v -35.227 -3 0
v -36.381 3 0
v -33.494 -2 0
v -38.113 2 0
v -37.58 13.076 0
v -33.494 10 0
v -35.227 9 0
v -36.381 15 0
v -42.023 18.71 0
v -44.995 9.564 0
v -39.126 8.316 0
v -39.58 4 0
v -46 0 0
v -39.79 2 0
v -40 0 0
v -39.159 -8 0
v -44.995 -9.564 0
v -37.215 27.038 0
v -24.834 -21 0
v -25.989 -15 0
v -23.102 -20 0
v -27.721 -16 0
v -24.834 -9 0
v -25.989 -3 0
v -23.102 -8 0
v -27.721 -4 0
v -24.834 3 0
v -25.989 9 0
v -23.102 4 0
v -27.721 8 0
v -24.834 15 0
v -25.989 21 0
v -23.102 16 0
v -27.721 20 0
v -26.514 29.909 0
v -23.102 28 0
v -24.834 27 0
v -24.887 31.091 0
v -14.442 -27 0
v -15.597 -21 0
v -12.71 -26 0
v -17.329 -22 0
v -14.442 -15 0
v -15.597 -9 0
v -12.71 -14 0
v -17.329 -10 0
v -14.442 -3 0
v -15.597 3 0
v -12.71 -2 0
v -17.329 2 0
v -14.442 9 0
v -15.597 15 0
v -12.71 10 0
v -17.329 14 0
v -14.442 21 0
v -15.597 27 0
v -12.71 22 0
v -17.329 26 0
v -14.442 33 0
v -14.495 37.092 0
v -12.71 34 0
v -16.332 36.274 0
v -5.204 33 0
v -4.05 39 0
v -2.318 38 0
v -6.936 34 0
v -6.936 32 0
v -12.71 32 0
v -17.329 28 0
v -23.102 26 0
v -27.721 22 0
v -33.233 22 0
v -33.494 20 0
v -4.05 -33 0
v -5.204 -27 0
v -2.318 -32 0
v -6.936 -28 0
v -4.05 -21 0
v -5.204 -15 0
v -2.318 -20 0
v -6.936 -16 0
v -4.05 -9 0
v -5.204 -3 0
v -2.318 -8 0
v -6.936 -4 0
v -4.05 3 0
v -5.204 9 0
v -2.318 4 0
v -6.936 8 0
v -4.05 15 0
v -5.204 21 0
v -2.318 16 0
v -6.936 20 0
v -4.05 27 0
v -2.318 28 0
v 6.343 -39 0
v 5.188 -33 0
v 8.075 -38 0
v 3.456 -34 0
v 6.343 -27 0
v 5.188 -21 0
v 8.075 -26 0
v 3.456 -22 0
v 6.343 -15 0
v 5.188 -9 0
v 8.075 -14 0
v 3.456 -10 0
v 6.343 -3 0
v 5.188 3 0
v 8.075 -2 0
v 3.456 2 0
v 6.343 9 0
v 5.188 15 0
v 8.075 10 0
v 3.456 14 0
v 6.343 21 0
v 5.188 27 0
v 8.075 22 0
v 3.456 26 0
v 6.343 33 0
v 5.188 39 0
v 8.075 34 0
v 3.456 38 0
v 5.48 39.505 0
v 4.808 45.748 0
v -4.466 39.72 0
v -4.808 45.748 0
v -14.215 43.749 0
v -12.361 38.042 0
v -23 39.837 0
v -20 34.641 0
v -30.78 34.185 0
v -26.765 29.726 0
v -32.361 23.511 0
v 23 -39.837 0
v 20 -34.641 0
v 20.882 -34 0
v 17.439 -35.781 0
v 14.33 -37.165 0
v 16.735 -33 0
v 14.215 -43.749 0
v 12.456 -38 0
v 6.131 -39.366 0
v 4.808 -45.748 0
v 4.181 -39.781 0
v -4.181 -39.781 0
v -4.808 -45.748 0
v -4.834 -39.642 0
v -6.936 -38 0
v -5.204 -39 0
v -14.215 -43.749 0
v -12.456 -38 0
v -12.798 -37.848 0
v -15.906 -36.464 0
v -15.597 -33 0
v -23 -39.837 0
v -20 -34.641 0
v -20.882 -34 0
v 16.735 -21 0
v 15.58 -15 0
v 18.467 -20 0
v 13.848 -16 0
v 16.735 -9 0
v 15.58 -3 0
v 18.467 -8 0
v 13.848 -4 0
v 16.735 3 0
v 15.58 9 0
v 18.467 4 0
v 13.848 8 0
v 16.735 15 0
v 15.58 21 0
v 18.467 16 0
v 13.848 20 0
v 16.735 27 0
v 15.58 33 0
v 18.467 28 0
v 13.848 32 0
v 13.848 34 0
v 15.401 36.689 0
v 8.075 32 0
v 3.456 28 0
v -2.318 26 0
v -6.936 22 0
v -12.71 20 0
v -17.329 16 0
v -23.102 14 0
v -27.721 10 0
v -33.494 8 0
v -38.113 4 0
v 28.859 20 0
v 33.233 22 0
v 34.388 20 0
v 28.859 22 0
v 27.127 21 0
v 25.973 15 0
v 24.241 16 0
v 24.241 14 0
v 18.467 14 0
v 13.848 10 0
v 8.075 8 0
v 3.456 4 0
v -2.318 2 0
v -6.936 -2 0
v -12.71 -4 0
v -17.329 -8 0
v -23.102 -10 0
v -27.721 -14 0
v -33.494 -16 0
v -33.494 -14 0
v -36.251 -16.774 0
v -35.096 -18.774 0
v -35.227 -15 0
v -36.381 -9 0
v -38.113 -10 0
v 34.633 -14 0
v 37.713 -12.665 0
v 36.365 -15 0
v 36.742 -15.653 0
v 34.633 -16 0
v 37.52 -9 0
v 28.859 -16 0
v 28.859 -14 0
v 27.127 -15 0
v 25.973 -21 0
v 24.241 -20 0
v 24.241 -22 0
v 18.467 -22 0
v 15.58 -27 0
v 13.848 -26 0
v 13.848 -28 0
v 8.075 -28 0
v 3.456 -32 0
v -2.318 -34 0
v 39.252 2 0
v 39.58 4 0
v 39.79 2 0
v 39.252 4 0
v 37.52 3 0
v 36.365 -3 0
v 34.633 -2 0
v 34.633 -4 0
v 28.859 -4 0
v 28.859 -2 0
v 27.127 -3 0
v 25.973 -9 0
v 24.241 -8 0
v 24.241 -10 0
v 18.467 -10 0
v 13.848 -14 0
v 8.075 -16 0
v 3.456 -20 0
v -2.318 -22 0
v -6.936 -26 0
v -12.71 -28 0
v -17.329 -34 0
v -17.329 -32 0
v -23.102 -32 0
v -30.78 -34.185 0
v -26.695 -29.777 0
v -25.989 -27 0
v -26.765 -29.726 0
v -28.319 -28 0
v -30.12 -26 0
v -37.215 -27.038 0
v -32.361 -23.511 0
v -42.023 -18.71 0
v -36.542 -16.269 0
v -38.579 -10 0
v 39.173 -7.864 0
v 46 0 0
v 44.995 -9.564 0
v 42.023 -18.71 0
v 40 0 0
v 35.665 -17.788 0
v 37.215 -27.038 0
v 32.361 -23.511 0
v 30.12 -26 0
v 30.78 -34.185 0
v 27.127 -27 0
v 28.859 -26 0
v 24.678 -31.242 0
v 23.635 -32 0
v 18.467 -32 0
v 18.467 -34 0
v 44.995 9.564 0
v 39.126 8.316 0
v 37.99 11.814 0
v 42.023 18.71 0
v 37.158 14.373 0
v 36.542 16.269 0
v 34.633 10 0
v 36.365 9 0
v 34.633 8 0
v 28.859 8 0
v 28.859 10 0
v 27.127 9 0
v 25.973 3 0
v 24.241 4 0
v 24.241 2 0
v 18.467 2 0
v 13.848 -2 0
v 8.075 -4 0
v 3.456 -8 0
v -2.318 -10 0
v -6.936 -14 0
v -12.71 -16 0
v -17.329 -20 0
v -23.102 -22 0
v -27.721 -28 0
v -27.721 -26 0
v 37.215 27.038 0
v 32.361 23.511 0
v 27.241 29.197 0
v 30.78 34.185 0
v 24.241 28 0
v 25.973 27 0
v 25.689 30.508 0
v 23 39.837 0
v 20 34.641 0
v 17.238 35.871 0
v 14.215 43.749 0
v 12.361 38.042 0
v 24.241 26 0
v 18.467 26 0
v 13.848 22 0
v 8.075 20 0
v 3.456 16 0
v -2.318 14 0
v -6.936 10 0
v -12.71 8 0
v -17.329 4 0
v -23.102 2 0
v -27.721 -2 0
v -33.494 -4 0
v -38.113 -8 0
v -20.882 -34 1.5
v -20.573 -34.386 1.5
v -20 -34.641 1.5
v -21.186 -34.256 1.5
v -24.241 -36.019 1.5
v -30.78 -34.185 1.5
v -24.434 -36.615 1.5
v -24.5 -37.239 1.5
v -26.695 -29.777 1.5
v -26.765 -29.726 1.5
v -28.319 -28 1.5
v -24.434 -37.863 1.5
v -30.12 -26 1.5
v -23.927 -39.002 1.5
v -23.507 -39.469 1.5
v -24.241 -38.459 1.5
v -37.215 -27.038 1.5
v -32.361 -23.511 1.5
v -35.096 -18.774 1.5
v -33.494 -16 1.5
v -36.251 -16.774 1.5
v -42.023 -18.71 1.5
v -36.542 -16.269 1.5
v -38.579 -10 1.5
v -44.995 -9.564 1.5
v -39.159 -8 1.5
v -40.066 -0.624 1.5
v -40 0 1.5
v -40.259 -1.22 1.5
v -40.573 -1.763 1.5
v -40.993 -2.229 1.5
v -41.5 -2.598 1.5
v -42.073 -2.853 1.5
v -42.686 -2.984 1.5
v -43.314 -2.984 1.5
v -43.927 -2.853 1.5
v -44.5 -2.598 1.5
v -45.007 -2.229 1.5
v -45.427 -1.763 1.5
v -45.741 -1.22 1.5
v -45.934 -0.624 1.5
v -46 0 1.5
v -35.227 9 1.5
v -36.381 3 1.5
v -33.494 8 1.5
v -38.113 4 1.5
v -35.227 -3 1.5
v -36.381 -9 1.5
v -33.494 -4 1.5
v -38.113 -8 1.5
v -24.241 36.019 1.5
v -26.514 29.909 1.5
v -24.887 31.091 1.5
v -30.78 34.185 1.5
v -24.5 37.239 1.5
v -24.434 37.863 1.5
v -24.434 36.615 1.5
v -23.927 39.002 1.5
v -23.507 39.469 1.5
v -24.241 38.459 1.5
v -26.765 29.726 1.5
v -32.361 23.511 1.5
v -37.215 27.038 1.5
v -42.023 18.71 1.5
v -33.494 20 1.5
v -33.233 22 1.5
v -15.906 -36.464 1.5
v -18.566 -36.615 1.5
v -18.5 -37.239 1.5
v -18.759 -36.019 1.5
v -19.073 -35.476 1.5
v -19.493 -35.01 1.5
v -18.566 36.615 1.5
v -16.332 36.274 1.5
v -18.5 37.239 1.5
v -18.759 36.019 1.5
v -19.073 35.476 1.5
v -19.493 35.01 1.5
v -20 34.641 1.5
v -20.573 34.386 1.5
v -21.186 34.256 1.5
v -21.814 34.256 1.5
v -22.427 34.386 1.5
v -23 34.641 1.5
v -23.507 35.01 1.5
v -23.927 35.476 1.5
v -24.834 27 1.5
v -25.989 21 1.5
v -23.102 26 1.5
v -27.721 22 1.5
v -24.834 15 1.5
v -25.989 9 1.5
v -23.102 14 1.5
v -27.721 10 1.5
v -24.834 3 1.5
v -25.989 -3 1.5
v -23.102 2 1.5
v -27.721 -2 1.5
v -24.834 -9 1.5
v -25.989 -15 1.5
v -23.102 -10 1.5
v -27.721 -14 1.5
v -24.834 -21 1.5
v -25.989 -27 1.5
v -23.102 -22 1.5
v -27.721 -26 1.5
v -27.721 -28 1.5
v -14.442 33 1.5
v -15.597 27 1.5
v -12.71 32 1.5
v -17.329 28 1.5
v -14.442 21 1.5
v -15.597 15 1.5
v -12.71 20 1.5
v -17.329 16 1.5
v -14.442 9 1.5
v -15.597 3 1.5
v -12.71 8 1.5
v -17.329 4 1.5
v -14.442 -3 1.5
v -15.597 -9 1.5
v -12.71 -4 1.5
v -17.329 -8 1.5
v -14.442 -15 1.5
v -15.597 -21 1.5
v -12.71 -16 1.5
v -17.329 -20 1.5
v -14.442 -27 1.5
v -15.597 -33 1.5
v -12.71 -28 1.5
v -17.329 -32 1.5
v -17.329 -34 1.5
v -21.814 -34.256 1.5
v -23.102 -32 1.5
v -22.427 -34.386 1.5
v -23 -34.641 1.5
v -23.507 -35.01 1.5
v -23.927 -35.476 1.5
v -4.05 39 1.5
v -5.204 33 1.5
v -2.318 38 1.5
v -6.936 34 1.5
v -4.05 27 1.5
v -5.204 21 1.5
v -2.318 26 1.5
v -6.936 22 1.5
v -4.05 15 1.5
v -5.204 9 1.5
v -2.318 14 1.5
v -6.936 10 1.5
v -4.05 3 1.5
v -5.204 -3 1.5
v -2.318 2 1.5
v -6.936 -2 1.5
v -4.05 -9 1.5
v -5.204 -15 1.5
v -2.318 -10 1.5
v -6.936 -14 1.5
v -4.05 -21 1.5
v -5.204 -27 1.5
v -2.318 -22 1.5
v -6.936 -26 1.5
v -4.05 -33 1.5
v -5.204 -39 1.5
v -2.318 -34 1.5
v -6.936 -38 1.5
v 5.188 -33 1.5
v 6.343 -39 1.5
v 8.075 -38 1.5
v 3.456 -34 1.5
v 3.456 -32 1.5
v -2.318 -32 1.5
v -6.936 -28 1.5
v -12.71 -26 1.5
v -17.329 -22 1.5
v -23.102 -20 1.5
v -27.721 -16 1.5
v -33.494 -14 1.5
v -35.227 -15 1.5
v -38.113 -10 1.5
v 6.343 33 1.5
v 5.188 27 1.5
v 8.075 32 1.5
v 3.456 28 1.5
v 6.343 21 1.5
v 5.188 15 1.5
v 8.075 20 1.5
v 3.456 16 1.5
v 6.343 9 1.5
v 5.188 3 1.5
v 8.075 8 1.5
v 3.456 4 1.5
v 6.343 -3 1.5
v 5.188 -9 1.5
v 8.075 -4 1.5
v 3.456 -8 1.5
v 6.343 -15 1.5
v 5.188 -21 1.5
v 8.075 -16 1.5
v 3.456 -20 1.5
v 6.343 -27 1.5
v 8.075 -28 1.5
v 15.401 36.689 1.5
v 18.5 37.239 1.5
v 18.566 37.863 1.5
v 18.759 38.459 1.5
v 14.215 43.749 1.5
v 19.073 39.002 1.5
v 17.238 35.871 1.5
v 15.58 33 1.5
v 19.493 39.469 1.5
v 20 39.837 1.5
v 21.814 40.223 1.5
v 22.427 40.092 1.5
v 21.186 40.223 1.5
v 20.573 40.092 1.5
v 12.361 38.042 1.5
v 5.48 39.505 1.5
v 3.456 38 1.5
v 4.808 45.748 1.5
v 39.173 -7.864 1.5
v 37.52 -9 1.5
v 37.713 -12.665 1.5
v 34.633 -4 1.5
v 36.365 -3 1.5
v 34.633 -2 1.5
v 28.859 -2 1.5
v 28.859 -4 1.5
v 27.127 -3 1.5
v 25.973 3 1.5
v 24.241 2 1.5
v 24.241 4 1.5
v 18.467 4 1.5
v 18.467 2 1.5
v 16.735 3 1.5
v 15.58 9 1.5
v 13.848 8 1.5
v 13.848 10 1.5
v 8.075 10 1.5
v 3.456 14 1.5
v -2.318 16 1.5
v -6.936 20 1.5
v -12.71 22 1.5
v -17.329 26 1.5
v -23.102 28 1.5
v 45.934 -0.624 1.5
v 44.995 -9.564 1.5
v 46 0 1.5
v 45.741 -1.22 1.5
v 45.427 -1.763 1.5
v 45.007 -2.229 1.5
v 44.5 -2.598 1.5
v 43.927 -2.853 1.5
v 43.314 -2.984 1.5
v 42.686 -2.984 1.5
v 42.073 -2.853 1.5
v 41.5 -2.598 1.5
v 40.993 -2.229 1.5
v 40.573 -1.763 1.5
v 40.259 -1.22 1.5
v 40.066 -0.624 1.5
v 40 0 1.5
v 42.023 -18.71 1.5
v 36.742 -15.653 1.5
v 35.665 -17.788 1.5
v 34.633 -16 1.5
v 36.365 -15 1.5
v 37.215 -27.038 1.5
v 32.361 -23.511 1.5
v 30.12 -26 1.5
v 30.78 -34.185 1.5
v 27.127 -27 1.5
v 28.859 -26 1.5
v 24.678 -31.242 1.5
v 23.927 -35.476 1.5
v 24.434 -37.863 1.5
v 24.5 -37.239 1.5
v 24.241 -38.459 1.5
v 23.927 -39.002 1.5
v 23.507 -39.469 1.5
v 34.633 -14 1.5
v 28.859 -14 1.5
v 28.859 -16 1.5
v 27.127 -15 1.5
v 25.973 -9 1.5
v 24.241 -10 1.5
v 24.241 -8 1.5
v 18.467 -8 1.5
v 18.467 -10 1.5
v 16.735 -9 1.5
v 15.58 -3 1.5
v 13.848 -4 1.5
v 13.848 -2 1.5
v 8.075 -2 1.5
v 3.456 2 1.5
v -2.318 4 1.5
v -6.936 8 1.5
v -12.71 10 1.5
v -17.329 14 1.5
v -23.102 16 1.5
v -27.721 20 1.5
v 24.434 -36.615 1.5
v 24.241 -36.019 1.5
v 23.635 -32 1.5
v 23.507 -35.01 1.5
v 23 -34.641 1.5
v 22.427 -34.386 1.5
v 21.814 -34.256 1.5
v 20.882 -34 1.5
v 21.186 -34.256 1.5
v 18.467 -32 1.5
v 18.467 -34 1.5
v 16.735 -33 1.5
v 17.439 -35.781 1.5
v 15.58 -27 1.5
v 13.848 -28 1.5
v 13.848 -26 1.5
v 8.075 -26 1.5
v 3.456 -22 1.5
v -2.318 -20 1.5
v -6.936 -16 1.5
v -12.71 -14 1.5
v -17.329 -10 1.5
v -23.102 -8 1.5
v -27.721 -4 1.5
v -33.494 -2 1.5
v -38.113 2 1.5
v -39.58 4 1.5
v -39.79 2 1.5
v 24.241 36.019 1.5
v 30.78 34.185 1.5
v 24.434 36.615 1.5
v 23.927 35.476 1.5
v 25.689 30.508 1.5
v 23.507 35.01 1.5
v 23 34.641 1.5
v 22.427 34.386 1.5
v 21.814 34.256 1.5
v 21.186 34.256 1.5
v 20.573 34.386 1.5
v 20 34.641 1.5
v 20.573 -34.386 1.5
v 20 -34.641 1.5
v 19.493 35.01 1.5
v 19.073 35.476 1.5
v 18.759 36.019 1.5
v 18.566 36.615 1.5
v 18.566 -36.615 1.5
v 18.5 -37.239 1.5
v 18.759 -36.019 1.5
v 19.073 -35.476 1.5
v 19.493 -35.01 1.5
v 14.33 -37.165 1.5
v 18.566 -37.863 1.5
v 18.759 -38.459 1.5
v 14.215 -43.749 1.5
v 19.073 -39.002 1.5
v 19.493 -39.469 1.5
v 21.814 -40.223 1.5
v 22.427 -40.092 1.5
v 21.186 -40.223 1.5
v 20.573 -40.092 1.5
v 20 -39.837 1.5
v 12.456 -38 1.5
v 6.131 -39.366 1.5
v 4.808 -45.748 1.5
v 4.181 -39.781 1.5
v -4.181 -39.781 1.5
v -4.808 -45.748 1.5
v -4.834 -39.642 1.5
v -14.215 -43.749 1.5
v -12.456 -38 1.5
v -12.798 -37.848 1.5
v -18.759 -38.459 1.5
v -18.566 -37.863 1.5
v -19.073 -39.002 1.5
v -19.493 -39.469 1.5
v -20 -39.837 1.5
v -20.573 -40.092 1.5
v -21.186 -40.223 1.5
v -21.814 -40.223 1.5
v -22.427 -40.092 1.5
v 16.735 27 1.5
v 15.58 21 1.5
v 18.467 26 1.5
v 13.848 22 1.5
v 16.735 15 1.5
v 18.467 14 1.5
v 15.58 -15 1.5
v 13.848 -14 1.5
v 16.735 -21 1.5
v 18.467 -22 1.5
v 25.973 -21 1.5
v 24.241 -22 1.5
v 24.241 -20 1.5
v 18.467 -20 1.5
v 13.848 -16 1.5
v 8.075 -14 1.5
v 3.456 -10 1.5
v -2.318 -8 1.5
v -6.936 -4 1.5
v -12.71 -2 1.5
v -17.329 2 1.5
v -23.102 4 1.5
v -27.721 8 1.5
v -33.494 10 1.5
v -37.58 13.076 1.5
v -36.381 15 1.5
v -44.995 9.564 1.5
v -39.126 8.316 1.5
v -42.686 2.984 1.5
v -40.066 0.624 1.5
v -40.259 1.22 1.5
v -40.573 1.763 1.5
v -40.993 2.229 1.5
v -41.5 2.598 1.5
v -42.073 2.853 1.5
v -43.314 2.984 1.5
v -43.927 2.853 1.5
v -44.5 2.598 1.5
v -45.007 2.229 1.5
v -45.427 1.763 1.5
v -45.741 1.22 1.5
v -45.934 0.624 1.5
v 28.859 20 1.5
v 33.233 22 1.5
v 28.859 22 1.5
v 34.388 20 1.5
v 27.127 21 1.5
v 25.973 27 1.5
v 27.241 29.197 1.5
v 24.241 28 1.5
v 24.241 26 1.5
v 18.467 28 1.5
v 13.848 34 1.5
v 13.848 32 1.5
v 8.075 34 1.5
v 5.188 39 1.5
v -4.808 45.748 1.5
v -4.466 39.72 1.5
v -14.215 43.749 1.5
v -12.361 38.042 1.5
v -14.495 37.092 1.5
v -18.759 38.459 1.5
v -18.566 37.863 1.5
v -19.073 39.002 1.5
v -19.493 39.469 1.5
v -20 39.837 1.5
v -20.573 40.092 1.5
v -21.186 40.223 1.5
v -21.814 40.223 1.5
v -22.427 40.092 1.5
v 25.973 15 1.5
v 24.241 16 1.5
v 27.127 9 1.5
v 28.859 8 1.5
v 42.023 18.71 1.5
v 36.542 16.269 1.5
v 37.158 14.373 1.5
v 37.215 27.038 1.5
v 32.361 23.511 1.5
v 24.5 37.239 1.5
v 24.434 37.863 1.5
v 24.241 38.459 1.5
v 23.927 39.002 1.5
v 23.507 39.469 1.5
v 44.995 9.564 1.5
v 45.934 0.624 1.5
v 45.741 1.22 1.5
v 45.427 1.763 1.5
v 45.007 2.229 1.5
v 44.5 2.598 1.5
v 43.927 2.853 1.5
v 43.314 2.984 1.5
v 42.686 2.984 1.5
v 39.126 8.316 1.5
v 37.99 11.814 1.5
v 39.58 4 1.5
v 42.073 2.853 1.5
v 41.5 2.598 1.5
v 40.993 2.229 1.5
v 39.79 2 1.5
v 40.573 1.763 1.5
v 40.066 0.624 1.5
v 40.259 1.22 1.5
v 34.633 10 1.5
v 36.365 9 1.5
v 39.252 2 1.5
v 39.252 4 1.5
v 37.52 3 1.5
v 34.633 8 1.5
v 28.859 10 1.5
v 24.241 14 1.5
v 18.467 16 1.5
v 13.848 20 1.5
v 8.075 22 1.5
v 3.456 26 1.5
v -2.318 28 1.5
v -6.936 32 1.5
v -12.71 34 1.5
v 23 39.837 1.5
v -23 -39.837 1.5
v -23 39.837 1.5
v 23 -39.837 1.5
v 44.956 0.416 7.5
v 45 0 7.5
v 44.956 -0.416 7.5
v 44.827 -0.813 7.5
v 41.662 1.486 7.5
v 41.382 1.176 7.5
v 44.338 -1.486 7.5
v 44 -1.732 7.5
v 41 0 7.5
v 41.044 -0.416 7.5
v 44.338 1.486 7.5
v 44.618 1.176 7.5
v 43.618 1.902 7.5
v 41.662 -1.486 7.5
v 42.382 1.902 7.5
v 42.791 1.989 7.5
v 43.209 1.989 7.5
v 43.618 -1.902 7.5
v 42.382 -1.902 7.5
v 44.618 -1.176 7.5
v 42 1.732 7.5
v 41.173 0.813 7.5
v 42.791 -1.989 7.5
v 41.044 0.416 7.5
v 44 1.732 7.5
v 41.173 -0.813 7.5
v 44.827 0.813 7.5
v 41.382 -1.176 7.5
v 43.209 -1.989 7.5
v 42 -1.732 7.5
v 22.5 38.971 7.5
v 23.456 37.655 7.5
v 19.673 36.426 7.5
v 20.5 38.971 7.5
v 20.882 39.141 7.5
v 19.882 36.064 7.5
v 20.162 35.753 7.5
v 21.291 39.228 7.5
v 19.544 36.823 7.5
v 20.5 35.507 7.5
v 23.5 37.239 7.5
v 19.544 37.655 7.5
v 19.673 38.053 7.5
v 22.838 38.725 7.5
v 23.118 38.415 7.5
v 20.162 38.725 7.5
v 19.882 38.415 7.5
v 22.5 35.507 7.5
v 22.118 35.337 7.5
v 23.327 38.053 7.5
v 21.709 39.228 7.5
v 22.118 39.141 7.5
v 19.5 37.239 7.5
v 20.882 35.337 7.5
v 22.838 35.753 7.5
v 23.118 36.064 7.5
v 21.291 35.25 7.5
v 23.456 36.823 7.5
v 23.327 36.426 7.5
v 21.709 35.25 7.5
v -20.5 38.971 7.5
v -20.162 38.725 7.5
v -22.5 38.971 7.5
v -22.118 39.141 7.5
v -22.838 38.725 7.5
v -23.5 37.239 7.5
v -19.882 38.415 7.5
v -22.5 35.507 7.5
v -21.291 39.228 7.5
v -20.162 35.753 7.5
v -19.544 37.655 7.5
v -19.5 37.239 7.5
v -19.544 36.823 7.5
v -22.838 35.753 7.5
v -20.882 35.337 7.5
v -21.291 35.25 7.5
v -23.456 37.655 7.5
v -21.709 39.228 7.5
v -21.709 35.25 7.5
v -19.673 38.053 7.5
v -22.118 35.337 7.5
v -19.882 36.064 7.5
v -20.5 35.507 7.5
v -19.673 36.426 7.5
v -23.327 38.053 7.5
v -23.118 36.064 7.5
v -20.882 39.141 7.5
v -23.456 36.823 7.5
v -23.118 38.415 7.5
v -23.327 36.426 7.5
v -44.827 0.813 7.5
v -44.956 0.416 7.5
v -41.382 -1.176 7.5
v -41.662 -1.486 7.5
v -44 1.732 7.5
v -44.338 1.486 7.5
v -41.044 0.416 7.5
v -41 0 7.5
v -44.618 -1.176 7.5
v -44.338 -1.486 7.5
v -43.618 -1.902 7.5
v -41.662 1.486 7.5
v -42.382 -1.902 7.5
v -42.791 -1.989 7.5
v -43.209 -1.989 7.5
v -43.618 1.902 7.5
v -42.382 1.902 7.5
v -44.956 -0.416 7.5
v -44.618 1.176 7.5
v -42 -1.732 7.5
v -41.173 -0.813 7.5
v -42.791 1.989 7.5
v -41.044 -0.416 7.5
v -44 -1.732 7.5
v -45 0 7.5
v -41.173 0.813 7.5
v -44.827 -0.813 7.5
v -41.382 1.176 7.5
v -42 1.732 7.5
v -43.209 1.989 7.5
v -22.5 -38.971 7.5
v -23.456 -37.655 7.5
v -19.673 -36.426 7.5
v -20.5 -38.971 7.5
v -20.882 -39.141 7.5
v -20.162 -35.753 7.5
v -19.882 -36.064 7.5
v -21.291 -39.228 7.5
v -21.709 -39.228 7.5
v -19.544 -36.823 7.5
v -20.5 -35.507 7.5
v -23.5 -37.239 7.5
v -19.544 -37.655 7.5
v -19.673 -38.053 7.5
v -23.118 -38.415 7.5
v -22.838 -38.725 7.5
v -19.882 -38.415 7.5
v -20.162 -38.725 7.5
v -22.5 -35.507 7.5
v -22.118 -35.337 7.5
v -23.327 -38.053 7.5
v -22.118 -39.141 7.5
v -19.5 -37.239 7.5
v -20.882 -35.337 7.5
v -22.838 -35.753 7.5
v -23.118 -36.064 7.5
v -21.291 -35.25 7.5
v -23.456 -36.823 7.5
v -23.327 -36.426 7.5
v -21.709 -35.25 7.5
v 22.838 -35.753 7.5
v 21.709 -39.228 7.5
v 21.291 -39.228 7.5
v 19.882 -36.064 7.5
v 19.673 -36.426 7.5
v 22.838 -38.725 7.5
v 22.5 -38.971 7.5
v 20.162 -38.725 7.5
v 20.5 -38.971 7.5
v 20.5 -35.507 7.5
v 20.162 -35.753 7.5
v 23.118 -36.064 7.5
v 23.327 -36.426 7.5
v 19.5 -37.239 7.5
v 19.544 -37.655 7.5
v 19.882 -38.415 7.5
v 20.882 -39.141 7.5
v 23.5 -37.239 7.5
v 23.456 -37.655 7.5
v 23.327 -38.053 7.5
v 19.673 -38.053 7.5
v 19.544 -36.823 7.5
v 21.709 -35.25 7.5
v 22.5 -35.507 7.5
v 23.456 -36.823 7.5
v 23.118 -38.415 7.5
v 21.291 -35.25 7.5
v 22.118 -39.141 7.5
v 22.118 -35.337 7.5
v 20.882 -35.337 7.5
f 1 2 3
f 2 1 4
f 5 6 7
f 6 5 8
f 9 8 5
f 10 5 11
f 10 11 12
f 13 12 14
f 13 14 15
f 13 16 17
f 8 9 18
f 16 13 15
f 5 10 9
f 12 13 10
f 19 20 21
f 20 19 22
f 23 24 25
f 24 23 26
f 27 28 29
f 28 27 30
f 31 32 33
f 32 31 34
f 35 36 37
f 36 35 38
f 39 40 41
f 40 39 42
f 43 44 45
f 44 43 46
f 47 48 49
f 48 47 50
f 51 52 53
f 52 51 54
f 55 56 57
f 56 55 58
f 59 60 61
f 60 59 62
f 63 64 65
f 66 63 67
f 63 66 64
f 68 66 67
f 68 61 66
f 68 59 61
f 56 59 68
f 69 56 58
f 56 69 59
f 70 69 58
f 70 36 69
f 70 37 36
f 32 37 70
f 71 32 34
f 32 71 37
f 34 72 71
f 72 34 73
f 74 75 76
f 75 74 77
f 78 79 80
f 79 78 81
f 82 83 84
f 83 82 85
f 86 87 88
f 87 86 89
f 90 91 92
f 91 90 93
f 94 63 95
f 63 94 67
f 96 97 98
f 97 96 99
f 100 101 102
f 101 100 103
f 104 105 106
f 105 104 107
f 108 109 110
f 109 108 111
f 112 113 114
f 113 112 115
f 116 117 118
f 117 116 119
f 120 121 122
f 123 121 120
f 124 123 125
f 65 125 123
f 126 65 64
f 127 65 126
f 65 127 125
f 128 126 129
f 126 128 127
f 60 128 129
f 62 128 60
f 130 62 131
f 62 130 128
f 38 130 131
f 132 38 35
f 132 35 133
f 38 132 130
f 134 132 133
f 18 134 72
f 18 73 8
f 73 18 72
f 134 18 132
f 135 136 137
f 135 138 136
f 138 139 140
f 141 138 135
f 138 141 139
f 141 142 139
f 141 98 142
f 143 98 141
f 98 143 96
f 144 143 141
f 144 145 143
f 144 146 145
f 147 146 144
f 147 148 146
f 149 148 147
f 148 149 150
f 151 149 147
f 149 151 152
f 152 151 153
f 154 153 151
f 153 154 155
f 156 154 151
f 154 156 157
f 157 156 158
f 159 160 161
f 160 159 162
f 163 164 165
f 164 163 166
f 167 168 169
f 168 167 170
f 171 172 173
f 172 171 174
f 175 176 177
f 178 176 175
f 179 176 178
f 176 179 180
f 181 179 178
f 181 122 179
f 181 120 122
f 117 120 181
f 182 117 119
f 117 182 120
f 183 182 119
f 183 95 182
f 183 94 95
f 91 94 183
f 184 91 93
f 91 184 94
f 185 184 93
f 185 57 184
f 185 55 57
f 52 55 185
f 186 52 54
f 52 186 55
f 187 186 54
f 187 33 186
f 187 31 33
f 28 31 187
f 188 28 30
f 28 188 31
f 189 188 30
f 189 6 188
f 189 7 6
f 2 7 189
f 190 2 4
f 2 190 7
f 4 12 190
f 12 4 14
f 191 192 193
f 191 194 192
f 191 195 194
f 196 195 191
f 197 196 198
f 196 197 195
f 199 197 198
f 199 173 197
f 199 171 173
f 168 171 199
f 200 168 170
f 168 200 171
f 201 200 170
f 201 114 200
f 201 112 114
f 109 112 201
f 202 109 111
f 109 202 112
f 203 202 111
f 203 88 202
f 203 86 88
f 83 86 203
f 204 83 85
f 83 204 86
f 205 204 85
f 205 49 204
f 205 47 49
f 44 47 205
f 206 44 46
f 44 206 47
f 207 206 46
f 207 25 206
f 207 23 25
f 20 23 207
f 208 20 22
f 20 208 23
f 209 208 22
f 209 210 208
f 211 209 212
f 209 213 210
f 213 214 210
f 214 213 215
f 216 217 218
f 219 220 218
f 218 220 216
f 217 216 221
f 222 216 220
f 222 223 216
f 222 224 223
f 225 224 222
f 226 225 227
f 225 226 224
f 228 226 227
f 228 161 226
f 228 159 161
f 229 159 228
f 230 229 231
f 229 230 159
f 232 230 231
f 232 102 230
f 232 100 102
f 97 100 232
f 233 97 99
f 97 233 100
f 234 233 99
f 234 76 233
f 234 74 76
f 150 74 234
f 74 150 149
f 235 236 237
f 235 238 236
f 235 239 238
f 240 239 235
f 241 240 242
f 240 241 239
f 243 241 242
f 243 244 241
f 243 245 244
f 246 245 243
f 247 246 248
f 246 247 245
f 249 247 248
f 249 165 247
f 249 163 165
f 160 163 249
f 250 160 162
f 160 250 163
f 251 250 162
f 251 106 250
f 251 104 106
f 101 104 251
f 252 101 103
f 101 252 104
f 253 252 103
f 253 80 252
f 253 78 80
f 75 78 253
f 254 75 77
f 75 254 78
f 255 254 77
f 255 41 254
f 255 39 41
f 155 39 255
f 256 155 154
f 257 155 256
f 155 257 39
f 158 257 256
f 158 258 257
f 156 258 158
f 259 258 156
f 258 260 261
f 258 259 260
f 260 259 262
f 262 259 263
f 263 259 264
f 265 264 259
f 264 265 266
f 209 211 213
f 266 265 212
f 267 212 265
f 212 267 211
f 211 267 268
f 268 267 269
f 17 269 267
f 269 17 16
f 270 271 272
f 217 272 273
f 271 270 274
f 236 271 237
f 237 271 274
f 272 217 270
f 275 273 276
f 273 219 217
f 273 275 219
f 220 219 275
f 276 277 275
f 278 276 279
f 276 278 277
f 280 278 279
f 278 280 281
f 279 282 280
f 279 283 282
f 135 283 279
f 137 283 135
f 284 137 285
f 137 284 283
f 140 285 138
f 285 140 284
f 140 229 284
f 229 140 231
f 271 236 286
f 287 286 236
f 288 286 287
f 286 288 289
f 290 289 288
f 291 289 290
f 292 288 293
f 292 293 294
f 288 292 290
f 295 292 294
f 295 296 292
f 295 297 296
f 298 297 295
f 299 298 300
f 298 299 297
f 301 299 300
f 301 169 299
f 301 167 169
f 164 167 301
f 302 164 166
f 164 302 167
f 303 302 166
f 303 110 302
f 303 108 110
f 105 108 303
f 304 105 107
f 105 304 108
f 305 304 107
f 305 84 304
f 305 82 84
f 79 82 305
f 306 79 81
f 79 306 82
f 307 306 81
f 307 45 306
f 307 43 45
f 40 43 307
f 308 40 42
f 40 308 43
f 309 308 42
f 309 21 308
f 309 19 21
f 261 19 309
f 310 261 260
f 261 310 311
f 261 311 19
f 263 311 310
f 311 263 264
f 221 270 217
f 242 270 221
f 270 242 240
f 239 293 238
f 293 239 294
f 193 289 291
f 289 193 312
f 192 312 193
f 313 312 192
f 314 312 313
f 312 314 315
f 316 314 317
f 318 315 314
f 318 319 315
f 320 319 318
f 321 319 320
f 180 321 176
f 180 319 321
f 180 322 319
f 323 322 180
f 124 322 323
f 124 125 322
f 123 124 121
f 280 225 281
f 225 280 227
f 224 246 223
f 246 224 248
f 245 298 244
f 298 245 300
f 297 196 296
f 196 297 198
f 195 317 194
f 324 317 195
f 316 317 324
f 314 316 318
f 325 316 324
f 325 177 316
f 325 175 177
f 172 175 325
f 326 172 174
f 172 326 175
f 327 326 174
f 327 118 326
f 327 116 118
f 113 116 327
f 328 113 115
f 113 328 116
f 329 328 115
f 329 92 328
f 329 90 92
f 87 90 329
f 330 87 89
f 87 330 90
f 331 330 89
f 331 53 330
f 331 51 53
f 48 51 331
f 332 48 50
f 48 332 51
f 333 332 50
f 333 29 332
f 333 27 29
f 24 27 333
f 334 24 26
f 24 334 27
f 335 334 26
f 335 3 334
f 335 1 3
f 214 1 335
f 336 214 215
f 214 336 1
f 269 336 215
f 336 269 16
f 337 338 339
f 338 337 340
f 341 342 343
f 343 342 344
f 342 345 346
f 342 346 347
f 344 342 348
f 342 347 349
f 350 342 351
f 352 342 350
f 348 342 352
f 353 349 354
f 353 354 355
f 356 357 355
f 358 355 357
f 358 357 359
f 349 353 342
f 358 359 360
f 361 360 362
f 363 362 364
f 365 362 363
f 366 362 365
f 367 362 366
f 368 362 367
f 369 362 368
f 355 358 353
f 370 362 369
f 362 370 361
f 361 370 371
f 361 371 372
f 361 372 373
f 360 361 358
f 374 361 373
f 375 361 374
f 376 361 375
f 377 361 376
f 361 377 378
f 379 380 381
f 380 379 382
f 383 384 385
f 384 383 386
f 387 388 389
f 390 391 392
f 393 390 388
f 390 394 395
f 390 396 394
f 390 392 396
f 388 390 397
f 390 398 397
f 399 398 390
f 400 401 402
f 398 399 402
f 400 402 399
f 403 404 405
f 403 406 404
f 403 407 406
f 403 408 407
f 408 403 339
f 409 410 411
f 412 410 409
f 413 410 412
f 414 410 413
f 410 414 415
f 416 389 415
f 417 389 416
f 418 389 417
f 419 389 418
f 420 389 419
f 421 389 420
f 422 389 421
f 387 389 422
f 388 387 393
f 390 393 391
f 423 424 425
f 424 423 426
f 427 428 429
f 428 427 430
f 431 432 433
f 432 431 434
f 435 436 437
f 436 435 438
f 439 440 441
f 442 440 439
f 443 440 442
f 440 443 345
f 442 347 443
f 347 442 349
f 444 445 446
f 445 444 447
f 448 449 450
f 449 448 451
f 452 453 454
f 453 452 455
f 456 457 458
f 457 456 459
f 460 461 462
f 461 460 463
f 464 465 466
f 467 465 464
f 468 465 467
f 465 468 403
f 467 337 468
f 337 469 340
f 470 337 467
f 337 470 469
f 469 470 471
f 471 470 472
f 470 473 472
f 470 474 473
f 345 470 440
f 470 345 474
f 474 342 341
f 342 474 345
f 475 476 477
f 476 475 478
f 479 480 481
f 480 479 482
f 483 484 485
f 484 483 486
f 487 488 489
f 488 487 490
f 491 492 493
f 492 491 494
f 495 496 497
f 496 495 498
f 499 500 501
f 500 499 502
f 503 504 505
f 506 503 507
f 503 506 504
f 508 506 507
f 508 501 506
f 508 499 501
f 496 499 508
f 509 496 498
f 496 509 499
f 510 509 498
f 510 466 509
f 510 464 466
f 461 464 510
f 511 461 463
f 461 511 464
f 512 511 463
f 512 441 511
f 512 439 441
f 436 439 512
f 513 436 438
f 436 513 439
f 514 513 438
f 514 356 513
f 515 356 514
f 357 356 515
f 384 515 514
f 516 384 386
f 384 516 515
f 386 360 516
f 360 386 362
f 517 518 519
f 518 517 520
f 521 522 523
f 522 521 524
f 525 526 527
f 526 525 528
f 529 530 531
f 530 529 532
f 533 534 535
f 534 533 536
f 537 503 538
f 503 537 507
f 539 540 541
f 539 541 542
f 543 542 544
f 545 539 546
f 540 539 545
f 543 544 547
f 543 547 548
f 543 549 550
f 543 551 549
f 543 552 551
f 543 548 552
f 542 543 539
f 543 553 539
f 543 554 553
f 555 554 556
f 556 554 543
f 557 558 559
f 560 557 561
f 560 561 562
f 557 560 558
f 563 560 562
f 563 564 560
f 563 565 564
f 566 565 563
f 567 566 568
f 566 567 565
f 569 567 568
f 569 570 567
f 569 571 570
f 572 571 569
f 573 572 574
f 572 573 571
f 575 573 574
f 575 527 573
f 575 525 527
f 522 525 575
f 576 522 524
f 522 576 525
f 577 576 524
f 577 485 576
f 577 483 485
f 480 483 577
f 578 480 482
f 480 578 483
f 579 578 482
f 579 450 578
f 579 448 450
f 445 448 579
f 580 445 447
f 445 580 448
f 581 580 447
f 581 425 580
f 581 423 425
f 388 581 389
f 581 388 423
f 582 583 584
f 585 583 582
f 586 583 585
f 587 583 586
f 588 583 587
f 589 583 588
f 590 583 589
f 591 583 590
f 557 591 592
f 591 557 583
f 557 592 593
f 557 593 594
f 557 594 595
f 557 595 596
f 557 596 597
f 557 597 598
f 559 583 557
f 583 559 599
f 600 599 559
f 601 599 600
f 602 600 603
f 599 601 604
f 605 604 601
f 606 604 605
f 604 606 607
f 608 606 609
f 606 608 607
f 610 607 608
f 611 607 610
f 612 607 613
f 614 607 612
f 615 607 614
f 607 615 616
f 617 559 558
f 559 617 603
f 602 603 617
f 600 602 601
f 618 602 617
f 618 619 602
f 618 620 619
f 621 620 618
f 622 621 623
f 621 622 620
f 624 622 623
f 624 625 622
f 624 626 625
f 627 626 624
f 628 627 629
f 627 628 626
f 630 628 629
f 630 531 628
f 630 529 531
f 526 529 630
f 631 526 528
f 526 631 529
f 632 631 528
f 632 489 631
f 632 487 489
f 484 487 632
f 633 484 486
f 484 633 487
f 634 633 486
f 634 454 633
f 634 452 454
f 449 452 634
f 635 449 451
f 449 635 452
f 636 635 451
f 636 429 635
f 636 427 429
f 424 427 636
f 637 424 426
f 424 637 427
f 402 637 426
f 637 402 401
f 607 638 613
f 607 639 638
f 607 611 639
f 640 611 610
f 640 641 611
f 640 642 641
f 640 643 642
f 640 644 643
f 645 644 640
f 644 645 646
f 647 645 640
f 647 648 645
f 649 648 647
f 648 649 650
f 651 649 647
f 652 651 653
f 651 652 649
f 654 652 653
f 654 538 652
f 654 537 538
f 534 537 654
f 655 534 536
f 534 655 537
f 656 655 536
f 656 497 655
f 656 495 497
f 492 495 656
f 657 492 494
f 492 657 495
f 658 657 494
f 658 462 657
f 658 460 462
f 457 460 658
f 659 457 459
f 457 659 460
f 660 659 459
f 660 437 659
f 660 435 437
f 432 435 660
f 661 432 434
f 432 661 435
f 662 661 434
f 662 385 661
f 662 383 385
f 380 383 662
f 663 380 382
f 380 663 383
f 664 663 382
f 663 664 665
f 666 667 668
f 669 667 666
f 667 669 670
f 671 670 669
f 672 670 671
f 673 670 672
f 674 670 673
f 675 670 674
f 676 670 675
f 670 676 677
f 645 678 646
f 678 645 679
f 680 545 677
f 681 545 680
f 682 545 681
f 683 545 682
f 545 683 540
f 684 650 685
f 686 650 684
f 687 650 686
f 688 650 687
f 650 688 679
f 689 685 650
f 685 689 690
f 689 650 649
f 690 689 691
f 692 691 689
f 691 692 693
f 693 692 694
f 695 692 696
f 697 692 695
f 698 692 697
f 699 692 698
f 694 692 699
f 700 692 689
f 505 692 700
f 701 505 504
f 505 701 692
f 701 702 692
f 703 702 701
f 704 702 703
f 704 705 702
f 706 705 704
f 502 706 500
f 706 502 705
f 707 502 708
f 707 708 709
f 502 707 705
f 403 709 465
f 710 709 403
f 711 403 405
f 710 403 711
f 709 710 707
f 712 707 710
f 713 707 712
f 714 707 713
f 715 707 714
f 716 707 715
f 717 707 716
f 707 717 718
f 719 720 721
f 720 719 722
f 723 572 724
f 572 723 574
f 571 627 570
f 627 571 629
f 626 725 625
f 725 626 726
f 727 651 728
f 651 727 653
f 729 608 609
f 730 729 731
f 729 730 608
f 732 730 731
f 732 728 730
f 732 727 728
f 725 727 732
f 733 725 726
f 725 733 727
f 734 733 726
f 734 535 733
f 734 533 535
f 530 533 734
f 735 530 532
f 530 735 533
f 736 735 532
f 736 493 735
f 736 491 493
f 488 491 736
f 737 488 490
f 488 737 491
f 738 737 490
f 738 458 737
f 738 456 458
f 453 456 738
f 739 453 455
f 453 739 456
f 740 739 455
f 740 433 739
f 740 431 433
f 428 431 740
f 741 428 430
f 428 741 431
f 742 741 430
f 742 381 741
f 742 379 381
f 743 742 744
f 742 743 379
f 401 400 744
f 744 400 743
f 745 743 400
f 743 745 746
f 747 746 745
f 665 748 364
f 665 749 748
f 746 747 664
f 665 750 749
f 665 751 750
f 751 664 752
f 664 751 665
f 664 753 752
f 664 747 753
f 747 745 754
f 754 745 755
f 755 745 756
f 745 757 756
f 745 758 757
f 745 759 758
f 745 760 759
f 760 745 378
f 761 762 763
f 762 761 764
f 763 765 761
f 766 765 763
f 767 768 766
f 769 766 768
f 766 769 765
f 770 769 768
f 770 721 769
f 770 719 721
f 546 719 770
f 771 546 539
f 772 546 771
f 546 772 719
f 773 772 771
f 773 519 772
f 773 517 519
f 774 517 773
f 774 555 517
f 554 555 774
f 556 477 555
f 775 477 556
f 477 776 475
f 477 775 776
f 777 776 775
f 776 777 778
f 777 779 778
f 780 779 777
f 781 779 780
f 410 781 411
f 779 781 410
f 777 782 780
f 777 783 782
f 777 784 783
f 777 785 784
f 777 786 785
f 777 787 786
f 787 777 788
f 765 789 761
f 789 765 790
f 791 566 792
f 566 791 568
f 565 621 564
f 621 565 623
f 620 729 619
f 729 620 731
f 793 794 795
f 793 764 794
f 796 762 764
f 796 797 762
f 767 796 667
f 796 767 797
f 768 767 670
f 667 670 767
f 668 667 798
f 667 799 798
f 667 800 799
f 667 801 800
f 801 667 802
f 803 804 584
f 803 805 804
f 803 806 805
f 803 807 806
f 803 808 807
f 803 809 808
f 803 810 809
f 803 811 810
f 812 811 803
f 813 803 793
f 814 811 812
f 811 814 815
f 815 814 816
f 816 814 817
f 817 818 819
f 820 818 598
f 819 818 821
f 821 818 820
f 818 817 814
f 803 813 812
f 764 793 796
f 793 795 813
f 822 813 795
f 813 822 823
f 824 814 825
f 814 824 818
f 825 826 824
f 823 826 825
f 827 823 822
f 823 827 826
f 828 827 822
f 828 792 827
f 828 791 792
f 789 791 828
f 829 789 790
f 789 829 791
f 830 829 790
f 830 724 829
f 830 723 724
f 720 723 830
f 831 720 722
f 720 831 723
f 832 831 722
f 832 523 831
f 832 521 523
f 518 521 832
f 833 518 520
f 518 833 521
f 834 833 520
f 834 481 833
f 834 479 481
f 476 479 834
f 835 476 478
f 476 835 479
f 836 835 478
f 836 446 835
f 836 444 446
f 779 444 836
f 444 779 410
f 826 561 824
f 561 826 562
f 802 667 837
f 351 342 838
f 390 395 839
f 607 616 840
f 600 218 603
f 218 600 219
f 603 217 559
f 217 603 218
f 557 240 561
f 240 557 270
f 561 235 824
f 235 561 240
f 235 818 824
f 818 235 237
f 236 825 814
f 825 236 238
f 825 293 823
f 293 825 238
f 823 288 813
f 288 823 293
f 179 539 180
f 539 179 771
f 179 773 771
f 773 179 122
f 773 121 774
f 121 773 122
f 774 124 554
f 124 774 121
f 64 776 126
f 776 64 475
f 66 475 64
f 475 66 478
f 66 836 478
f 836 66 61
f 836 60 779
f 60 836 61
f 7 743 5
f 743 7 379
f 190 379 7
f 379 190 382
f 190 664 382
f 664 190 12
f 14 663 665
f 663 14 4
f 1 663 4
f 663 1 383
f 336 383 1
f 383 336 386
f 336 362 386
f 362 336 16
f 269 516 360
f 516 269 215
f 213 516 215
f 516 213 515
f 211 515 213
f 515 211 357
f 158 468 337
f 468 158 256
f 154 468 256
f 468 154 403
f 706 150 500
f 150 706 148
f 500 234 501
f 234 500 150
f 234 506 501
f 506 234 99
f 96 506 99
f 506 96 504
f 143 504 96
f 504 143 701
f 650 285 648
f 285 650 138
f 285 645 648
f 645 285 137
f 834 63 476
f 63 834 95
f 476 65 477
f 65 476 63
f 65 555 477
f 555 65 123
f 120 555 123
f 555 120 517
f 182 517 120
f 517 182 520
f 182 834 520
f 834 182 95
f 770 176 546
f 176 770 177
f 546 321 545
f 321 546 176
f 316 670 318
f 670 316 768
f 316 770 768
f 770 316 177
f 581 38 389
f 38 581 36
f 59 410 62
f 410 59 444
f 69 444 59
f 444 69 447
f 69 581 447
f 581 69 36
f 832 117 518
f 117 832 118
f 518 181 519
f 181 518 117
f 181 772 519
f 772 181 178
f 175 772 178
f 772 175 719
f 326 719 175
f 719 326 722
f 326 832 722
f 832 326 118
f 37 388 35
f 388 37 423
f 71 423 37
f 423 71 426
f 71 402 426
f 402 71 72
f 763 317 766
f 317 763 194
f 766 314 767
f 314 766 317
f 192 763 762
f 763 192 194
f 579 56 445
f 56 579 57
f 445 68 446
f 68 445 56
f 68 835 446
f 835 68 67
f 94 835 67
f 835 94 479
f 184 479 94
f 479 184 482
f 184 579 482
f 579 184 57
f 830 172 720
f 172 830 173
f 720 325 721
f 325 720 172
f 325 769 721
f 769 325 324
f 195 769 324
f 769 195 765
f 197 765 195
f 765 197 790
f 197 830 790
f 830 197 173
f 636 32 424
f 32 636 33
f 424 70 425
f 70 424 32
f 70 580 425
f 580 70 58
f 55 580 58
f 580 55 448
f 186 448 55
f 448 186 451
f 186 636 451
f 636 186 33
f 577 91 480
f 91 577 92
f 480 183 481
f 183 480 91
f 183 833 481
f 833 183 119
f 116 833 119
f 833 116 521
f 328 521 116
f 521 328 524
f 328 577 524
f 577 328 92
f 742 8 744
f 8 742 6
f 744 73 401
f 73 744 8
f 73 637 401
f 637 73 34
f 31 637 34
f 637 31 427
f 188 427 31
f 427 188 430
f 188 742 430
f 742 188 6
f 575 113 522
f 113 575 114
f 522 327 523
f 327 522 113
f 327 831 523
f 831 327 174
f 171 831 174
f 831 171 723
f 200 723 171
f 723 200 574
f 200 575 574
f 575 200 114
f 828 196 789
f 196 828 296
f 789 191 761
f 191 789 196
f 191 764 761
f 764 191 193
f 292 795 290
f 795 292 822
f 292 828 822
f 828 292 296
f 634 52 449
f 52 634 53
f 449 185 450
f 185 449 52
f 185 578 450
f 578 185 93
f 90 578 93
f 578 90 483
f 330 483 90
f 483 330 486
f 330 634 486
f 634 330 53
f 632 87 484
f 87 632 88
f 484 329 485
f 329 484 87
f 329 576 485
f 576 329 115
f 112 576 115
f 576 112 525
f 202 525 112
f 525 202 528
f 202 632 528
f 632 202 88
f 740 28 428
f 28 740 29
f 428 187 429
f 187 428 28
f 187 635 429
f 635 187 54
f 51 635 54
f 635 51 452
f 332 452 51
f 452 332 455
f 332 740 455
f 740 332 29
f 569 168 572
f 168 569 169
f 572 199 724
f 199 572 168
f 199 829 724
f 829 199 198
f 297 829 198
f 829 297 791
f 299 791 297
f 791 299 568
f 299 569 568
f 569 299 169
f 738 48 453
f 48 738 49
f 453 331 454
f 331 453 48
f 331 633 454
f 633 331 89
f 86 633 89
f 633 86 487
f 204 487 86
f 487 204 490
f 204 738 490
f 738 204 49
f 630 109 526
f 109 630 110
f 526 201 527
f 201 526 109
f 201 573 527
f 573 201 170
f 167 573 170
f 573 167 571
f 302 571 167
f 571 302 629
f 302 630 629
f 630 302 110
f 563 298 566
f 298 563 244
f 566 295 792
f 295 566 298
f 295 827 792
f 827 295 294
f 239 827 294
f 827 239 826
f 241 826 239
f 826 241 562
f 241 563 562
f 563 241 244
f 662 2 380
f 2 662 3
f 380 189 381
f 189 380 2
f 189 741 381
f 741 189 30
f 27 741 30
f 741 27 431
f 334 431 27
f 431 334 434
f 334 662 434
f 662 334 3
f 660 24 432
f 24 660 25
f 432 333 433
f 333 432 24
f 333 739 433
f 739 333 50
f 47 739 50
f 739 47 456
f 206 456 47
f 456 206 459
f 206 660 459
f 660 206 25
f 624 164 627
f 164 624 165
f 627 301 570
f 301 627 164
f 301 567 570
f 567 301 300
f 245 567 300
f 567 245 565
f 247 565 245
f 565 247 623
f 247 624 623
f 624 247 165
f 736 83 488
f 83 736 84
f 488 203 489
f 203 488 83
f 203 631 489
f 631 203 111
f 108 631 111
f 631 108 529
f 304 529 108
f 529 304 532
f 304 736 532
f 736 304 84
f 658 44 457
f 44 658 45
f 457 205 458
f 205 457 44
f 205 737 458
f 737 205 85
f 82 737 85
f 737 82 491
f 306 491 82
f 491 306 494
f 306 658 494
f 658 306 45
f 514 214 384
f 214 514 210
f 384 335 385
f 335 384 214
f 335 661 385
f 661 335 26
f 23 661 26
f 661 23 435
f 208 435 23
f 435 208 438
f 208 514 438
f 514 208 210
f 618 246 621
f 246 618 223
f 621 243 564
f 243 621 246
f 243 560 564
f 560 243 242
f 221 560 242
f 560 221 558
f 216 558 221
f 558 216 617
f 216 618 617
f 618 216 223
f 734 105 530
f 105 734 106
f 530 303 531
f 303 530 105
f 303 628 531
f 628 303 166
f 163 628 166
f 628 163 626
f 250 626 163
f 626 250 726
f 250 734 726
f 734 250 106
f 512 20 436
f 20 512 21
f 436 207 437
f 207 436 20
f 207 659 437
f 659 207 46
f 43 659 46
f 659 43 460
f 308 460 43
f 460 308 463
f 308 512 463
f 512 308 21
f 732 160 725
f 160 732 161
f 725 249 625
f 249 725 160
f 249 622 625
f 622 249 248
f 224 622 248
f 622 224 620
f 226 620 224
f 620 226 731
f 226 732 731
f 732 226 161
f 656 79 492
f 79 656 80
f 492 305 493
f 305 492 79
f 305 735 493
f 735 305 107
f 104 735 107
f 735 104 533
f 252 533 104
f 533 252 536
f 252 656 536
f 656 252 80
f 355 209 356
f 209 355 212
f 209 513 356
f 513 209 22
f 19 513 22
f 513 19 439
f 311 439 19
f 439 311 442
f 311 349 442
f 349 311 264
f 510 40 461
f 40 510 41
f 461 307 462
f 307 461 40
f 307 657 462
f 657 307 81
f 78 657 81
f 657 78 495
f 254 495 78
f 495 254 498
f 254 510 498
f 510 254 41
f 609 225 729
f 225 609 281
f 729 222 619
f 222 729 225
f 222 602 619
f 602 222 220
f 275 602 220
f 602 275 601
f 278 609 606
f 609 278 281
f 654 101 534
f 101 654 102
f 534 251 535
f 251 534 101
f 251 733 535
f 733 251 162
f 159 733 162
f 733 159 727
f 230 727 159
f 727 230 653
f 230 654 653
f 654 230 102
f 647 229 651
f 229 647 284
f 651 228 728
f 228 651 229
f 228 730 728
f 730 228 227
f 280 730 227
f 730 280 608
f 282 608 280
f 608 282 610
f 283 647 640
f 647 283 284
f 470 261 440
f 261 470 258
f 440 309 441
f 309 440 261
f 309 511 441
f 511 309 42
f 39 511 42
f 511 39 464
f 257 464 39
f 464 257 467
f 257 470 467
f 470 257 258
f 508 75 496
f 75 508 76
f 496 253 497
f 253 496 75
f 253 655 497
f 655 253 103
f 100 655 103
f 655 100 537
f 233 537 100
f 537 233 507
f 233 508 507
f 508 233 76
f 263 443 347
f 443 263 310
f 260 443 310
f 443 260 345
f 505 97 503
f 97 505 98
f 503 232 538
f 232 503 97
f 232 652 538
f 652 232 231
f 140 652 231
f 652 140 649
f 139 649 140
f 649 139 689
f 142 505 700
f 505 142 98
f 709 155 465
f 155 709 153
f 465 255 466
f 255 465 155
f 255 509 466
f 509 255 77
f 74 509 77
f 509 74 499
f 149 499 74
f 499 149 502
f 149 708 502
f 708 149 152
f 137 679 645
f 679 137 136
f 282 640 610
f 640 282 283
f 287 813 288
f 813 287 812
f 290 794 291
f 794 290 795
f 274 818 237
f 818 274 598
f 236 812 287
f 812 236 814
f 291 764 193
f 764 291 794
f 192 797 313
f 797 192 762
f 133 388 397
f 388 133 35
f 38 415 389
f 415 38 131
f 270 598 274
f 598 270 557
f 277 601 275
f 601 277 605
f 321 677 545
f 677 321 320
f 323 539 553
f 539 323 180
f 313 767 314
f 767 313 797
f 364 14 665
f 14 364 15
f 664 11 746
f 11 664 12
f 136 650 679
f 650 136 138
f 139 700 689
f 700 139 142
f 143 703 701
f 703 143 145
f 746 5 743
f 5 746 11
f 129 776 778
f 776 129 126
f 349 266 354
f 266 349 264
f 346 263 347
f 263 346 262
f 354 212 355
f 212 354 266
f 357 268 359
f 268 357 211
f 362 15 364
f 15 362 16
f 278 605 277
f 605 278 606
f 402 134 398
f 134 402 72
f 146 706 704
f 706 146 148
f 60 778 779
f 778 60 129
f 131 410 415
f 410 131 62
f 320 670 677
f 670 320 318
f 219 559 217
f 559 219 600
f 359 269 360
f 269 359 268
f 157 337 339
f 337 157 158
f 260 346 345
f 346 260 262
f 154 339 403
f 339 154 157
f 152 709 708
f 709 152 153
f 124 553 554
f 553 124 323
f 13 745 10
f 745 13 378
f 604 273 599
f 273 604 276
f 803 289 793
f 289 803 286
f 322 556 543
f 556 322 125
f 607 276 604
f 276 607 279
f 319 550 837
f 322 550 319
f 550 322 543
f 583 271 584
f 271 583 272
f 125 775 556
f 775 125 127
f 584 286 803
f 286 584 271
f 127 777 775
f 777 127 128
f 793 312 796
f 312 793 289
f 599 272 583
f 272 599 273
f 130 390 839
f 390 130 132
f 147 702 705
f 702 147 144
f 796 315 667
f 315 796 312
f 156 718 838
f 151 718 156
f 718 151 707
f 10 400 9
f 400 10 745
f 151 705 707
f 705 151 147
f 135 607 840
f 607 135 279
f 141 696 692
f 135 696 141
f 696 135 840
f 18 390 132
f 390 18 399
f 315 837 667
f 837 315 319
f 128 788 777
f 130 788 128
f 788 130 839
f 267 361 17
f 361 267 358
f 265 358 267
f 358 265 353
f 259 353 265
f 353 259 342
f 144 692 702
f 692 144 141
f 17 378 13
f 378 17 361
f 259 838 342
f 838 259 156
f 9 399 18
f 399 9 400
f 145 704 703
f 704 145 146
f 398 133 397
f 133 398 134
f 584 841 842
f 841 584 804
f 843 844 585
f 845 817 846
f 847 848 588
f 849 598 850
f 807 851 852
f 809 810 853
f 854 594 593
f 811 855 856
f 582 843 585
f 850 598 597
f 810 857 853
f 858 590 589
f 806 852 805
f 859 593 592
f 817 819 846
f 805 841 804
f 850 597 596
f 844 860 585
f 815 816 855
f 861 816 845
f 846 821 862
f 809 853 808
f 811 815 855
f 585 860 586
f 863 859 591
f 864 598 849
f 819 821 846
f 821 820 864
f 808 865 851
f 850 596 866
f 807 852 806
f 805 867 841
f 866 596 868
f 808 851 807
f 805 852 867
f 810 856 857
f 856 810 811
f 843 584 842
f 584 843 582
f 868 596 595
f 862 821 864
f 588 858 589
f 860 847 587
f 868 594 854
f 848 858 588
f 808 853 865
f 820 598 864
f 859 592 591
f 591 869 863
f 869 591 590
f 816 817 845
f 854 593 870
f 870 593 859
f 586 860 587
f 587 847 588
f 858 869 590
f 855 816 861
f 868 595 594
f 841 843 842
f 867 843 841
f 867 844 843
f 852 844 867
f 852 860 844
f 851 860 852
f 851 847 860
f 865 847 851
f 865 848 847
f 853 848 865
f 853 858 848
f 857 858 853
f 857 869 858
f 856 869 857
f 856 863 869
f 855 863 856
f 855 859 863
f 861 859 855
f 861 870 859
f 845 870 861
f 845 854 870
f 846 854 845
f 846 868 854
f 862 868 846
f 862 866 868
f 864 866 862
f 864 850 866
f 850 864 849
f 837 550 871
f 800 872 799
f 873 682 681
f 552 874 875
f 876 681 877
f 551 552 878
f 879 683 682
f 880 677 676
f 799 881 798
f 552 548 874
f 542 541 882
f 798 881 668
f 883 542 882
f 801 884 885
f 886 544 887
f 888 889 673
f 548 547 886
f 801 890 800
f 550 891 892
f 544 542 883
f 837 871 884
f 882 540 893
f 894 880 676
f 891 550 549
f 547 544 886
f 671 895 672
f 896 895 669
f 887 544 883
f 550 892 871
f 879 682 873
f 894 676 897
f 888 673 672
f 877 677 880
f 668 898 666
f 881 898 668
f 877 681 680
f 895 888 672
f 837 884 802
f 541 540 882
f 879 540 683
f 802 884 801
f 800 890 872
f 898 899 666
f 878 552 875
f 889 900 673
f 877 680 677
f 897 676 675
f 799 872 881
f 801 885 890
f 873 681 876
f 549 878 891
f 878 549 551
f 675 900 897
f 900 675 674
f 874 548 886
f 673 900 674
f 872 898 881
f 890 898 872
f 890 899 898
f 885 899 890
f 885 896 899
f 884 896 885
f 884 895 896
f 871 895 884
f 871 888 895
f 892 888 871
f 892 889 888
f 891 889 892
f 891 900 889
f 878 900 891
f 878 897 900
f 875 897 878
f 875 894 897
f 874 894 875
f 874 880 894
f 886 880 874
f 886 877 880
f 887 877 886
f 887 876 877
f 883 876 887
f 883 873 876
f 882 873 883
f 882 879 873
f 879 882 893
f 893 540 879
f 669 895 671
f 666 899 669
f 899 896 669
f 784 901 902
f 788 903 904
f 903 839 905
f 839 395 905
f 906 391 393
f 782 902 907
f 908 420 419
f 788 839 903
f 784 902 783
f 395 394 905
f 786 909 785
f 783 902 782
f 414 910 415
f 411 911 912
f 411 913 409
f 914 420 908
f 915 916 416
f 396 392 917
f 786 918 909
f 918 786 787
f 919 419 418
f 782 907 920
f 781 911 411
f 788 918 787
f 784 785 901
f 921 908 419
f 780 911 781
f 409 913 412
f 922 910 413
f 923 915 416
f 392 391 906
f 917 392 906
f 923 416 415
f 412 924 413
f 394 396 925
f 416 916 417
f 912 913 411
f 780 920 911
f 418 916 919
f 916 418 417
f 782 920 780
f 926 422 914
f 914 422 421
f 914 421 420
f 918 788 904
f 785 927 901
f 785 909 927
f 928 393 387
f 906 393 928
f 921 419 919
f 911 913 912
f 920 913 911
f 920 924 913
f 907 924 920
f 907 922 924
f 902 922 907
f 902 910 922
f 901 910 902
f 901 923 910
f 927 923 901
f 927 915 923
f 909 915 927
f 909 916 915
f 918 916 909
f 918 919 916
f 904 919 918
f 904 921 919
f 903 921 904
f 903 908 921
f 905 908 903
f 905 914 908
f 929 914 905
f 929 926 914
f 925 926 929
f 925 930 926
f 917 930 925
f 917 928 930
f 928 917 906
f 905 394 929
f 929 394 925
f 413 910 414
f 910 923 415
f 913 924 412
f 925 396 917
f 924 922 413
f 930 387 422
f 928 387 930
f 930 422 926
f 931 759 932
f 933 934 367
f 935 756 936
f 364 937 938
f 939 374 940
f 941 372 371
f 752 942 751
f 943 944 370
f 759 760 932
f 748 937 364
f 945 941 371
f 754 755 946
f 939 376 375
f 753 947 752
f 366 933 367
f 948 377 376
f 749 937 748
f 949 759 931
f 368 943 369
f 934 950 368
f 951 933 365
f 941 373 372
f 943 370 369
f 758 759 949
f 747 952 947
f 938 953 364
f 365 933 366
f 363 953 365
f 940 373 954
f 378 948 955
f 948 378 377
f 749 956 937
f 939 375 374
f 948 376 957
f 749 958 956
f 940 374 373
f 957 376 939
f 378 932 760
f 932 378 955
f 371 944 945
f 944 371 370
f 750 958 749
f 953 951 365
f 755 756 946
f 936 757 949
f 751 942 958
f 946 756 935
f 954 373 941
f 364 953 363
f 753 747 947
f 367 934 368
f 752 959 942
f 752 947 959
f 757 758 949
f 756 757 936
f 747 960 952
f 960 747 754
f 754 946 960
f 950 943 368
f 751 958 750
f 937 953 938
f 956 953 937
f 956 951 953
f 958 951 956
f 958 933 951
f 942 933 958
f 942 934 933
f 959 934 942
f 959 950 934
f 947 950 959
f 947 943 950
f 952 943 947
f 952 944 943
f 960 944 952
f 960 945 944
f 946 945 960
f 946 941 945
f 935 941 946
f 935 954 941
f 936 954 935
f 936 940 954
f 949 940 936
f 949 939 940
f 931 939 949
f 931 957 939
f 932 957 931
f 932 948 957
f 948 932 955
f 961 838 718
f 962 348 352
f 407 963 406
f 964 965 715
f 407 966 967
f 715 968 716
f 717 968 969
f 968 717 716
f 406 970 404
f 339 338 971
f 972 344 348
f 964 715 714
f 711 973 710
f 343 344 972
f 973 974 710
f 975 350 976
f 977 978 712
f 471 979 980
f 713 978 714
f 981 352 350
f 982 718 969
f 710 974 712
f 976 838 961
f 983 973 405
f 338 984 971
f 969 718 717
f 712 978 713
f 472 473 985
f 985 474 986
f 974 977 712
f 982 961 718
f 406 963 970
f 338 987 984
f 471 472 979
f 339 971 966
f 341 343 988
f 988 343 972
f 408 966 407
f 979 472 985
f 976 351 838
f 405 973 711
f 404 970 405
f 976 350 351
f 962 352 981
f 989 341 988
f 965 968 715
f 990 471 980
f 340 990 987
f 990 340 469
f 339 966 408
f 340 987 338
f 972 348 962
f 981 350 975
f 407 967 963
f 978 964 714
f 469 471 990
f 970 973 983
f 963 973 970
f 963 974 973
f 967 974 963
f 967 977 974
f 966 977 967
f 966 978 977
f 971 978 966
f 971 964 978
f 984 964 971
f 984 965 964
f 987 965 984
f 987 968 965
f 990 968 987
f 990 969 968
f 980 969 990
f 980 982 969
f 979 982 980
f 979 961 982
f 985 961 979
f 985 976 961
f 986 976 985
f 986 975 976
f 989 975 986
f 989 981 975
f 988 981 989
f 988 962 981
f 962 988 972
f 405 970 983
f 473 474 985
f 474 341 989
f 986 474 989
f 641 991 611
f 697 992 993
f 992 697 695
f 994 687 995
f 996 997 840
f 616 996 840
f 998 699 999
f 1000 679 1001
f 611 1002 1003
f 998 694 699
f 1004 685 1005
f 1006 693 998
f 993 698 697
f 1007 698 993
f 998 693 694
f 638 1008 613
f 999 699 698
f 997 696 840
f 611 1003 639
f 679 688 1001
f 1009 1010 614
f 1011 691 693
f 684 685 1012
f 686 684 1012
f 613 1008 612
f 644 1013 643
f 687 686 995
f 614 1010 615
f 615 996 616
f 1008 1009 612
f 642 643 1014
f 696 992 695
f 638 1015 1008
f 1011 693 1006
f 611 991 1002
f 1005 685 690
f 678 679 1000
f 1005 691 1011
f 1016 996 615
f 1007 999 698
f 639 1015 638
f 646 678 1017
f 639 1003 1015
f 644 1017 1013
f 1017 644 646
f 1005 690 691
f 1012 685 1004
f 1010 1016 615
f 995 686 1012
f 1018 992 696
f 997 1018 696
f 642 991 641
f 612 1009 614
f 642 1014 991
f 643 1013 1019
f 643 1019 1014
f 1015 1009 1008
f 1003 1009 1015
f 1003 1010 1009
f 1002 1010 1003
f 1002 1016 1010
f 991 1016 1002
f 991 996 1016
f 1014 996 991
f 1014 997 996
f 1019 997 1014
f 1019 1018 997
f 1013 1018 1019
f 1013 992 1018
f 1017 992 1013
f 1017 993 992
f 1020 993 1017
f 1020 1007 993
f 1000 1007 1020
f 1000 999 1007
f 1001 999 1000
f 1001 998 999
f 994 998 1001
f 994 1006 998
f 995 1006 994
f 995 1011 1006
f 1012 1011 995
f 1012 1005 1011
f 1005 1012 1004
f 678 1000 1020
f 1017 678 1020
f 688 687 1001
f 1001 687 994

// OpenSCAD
// file: lib/honeycomb.scad
// Honeycomb code taken from:
// PrzemoF @ http://forum.openscad.org/Beginner-Honeycomb-advice-needed-td4556.html
// Post: http://forum.openscad.org/Beginner-Honeycomb-advice-needed-tp4556p4592.html
module hc_column(length, cell_size, wall_thickness) {
  no_of_cells = floor(length / (cell_size + wall_thickness)) ;

  for (i = [0 : no_of_cells]) {
    translate([0,(i * (cell_size + wall_thickness)),0])
       circle($fn = 6, r = cell_size * (sqrt(3)/3));
  }
}

module honeycomb (length, width, height, cell_size, wall_thickness) {
  no_of_rows = floor(1.2 * length / (cell_size + wall_thickness)) ;

  tr_mod = cell_size + wall_thickness;
  tr_x = sqrt(3)/2 * tr_mod;
  tr_y = tr_mod / 2;
  off_x = -1 * wall_thickness / 2;
  off_y = wall_thickness / 2;
  linear_extrude(height = height, center = true, convexity = 10, twist = 0, slices = 1)
    difference(){
      square([length, width]);
      for (i = [0 : no_of_rows]) {
        assign(x_pos = i * tr_x + off_x, y_pos = (i % 2) * tr_y + off_y)
          translate([x_pos, y_pos, 0])
           hc_column(width, cell_size, wall_thickness);
      }
    }
}
// main file
use <lib/honeycomb.scad>;

use_hex_center = 0;

size=80;
height=1.5;
outer_ring=12;

module center_section (use_hex_center)
{
  if (use_hex_center)
    translate(v = [0, 0, height/2])
      linear_extrude(height = height, center = true, convexity = 10, twist = 0, slices = 1)
        circle($fn = 0.5, d = size);
  else
   cylinder(h=height, d=size);
}


// Honeycomb
//honeycomb(length, width, height, cell_size, wall_thickness);
intersection() {
  translate(v = [-size/2, -size/2, height/2]){ honeycomb(size, size, height, 10, 2); }
  center_section(use_hex_center);
}

// Ring around the edge
if (true)
  difference(){
    cylinder(h=height, d=size+outer_ring, $fs=0.05);
    center_section(use_hex_center);
  }

// Feet
for (r=[0:60:300]) 
  rotate(r + use_hex_center * 30) 
    translate([(size+outer_ring/2)/2 - use_hex_center*outer_ring/2.5, 0, height]) 
      cylinder(h=height*4, r1=3, r2=2, center=false, $fs=0.3);
